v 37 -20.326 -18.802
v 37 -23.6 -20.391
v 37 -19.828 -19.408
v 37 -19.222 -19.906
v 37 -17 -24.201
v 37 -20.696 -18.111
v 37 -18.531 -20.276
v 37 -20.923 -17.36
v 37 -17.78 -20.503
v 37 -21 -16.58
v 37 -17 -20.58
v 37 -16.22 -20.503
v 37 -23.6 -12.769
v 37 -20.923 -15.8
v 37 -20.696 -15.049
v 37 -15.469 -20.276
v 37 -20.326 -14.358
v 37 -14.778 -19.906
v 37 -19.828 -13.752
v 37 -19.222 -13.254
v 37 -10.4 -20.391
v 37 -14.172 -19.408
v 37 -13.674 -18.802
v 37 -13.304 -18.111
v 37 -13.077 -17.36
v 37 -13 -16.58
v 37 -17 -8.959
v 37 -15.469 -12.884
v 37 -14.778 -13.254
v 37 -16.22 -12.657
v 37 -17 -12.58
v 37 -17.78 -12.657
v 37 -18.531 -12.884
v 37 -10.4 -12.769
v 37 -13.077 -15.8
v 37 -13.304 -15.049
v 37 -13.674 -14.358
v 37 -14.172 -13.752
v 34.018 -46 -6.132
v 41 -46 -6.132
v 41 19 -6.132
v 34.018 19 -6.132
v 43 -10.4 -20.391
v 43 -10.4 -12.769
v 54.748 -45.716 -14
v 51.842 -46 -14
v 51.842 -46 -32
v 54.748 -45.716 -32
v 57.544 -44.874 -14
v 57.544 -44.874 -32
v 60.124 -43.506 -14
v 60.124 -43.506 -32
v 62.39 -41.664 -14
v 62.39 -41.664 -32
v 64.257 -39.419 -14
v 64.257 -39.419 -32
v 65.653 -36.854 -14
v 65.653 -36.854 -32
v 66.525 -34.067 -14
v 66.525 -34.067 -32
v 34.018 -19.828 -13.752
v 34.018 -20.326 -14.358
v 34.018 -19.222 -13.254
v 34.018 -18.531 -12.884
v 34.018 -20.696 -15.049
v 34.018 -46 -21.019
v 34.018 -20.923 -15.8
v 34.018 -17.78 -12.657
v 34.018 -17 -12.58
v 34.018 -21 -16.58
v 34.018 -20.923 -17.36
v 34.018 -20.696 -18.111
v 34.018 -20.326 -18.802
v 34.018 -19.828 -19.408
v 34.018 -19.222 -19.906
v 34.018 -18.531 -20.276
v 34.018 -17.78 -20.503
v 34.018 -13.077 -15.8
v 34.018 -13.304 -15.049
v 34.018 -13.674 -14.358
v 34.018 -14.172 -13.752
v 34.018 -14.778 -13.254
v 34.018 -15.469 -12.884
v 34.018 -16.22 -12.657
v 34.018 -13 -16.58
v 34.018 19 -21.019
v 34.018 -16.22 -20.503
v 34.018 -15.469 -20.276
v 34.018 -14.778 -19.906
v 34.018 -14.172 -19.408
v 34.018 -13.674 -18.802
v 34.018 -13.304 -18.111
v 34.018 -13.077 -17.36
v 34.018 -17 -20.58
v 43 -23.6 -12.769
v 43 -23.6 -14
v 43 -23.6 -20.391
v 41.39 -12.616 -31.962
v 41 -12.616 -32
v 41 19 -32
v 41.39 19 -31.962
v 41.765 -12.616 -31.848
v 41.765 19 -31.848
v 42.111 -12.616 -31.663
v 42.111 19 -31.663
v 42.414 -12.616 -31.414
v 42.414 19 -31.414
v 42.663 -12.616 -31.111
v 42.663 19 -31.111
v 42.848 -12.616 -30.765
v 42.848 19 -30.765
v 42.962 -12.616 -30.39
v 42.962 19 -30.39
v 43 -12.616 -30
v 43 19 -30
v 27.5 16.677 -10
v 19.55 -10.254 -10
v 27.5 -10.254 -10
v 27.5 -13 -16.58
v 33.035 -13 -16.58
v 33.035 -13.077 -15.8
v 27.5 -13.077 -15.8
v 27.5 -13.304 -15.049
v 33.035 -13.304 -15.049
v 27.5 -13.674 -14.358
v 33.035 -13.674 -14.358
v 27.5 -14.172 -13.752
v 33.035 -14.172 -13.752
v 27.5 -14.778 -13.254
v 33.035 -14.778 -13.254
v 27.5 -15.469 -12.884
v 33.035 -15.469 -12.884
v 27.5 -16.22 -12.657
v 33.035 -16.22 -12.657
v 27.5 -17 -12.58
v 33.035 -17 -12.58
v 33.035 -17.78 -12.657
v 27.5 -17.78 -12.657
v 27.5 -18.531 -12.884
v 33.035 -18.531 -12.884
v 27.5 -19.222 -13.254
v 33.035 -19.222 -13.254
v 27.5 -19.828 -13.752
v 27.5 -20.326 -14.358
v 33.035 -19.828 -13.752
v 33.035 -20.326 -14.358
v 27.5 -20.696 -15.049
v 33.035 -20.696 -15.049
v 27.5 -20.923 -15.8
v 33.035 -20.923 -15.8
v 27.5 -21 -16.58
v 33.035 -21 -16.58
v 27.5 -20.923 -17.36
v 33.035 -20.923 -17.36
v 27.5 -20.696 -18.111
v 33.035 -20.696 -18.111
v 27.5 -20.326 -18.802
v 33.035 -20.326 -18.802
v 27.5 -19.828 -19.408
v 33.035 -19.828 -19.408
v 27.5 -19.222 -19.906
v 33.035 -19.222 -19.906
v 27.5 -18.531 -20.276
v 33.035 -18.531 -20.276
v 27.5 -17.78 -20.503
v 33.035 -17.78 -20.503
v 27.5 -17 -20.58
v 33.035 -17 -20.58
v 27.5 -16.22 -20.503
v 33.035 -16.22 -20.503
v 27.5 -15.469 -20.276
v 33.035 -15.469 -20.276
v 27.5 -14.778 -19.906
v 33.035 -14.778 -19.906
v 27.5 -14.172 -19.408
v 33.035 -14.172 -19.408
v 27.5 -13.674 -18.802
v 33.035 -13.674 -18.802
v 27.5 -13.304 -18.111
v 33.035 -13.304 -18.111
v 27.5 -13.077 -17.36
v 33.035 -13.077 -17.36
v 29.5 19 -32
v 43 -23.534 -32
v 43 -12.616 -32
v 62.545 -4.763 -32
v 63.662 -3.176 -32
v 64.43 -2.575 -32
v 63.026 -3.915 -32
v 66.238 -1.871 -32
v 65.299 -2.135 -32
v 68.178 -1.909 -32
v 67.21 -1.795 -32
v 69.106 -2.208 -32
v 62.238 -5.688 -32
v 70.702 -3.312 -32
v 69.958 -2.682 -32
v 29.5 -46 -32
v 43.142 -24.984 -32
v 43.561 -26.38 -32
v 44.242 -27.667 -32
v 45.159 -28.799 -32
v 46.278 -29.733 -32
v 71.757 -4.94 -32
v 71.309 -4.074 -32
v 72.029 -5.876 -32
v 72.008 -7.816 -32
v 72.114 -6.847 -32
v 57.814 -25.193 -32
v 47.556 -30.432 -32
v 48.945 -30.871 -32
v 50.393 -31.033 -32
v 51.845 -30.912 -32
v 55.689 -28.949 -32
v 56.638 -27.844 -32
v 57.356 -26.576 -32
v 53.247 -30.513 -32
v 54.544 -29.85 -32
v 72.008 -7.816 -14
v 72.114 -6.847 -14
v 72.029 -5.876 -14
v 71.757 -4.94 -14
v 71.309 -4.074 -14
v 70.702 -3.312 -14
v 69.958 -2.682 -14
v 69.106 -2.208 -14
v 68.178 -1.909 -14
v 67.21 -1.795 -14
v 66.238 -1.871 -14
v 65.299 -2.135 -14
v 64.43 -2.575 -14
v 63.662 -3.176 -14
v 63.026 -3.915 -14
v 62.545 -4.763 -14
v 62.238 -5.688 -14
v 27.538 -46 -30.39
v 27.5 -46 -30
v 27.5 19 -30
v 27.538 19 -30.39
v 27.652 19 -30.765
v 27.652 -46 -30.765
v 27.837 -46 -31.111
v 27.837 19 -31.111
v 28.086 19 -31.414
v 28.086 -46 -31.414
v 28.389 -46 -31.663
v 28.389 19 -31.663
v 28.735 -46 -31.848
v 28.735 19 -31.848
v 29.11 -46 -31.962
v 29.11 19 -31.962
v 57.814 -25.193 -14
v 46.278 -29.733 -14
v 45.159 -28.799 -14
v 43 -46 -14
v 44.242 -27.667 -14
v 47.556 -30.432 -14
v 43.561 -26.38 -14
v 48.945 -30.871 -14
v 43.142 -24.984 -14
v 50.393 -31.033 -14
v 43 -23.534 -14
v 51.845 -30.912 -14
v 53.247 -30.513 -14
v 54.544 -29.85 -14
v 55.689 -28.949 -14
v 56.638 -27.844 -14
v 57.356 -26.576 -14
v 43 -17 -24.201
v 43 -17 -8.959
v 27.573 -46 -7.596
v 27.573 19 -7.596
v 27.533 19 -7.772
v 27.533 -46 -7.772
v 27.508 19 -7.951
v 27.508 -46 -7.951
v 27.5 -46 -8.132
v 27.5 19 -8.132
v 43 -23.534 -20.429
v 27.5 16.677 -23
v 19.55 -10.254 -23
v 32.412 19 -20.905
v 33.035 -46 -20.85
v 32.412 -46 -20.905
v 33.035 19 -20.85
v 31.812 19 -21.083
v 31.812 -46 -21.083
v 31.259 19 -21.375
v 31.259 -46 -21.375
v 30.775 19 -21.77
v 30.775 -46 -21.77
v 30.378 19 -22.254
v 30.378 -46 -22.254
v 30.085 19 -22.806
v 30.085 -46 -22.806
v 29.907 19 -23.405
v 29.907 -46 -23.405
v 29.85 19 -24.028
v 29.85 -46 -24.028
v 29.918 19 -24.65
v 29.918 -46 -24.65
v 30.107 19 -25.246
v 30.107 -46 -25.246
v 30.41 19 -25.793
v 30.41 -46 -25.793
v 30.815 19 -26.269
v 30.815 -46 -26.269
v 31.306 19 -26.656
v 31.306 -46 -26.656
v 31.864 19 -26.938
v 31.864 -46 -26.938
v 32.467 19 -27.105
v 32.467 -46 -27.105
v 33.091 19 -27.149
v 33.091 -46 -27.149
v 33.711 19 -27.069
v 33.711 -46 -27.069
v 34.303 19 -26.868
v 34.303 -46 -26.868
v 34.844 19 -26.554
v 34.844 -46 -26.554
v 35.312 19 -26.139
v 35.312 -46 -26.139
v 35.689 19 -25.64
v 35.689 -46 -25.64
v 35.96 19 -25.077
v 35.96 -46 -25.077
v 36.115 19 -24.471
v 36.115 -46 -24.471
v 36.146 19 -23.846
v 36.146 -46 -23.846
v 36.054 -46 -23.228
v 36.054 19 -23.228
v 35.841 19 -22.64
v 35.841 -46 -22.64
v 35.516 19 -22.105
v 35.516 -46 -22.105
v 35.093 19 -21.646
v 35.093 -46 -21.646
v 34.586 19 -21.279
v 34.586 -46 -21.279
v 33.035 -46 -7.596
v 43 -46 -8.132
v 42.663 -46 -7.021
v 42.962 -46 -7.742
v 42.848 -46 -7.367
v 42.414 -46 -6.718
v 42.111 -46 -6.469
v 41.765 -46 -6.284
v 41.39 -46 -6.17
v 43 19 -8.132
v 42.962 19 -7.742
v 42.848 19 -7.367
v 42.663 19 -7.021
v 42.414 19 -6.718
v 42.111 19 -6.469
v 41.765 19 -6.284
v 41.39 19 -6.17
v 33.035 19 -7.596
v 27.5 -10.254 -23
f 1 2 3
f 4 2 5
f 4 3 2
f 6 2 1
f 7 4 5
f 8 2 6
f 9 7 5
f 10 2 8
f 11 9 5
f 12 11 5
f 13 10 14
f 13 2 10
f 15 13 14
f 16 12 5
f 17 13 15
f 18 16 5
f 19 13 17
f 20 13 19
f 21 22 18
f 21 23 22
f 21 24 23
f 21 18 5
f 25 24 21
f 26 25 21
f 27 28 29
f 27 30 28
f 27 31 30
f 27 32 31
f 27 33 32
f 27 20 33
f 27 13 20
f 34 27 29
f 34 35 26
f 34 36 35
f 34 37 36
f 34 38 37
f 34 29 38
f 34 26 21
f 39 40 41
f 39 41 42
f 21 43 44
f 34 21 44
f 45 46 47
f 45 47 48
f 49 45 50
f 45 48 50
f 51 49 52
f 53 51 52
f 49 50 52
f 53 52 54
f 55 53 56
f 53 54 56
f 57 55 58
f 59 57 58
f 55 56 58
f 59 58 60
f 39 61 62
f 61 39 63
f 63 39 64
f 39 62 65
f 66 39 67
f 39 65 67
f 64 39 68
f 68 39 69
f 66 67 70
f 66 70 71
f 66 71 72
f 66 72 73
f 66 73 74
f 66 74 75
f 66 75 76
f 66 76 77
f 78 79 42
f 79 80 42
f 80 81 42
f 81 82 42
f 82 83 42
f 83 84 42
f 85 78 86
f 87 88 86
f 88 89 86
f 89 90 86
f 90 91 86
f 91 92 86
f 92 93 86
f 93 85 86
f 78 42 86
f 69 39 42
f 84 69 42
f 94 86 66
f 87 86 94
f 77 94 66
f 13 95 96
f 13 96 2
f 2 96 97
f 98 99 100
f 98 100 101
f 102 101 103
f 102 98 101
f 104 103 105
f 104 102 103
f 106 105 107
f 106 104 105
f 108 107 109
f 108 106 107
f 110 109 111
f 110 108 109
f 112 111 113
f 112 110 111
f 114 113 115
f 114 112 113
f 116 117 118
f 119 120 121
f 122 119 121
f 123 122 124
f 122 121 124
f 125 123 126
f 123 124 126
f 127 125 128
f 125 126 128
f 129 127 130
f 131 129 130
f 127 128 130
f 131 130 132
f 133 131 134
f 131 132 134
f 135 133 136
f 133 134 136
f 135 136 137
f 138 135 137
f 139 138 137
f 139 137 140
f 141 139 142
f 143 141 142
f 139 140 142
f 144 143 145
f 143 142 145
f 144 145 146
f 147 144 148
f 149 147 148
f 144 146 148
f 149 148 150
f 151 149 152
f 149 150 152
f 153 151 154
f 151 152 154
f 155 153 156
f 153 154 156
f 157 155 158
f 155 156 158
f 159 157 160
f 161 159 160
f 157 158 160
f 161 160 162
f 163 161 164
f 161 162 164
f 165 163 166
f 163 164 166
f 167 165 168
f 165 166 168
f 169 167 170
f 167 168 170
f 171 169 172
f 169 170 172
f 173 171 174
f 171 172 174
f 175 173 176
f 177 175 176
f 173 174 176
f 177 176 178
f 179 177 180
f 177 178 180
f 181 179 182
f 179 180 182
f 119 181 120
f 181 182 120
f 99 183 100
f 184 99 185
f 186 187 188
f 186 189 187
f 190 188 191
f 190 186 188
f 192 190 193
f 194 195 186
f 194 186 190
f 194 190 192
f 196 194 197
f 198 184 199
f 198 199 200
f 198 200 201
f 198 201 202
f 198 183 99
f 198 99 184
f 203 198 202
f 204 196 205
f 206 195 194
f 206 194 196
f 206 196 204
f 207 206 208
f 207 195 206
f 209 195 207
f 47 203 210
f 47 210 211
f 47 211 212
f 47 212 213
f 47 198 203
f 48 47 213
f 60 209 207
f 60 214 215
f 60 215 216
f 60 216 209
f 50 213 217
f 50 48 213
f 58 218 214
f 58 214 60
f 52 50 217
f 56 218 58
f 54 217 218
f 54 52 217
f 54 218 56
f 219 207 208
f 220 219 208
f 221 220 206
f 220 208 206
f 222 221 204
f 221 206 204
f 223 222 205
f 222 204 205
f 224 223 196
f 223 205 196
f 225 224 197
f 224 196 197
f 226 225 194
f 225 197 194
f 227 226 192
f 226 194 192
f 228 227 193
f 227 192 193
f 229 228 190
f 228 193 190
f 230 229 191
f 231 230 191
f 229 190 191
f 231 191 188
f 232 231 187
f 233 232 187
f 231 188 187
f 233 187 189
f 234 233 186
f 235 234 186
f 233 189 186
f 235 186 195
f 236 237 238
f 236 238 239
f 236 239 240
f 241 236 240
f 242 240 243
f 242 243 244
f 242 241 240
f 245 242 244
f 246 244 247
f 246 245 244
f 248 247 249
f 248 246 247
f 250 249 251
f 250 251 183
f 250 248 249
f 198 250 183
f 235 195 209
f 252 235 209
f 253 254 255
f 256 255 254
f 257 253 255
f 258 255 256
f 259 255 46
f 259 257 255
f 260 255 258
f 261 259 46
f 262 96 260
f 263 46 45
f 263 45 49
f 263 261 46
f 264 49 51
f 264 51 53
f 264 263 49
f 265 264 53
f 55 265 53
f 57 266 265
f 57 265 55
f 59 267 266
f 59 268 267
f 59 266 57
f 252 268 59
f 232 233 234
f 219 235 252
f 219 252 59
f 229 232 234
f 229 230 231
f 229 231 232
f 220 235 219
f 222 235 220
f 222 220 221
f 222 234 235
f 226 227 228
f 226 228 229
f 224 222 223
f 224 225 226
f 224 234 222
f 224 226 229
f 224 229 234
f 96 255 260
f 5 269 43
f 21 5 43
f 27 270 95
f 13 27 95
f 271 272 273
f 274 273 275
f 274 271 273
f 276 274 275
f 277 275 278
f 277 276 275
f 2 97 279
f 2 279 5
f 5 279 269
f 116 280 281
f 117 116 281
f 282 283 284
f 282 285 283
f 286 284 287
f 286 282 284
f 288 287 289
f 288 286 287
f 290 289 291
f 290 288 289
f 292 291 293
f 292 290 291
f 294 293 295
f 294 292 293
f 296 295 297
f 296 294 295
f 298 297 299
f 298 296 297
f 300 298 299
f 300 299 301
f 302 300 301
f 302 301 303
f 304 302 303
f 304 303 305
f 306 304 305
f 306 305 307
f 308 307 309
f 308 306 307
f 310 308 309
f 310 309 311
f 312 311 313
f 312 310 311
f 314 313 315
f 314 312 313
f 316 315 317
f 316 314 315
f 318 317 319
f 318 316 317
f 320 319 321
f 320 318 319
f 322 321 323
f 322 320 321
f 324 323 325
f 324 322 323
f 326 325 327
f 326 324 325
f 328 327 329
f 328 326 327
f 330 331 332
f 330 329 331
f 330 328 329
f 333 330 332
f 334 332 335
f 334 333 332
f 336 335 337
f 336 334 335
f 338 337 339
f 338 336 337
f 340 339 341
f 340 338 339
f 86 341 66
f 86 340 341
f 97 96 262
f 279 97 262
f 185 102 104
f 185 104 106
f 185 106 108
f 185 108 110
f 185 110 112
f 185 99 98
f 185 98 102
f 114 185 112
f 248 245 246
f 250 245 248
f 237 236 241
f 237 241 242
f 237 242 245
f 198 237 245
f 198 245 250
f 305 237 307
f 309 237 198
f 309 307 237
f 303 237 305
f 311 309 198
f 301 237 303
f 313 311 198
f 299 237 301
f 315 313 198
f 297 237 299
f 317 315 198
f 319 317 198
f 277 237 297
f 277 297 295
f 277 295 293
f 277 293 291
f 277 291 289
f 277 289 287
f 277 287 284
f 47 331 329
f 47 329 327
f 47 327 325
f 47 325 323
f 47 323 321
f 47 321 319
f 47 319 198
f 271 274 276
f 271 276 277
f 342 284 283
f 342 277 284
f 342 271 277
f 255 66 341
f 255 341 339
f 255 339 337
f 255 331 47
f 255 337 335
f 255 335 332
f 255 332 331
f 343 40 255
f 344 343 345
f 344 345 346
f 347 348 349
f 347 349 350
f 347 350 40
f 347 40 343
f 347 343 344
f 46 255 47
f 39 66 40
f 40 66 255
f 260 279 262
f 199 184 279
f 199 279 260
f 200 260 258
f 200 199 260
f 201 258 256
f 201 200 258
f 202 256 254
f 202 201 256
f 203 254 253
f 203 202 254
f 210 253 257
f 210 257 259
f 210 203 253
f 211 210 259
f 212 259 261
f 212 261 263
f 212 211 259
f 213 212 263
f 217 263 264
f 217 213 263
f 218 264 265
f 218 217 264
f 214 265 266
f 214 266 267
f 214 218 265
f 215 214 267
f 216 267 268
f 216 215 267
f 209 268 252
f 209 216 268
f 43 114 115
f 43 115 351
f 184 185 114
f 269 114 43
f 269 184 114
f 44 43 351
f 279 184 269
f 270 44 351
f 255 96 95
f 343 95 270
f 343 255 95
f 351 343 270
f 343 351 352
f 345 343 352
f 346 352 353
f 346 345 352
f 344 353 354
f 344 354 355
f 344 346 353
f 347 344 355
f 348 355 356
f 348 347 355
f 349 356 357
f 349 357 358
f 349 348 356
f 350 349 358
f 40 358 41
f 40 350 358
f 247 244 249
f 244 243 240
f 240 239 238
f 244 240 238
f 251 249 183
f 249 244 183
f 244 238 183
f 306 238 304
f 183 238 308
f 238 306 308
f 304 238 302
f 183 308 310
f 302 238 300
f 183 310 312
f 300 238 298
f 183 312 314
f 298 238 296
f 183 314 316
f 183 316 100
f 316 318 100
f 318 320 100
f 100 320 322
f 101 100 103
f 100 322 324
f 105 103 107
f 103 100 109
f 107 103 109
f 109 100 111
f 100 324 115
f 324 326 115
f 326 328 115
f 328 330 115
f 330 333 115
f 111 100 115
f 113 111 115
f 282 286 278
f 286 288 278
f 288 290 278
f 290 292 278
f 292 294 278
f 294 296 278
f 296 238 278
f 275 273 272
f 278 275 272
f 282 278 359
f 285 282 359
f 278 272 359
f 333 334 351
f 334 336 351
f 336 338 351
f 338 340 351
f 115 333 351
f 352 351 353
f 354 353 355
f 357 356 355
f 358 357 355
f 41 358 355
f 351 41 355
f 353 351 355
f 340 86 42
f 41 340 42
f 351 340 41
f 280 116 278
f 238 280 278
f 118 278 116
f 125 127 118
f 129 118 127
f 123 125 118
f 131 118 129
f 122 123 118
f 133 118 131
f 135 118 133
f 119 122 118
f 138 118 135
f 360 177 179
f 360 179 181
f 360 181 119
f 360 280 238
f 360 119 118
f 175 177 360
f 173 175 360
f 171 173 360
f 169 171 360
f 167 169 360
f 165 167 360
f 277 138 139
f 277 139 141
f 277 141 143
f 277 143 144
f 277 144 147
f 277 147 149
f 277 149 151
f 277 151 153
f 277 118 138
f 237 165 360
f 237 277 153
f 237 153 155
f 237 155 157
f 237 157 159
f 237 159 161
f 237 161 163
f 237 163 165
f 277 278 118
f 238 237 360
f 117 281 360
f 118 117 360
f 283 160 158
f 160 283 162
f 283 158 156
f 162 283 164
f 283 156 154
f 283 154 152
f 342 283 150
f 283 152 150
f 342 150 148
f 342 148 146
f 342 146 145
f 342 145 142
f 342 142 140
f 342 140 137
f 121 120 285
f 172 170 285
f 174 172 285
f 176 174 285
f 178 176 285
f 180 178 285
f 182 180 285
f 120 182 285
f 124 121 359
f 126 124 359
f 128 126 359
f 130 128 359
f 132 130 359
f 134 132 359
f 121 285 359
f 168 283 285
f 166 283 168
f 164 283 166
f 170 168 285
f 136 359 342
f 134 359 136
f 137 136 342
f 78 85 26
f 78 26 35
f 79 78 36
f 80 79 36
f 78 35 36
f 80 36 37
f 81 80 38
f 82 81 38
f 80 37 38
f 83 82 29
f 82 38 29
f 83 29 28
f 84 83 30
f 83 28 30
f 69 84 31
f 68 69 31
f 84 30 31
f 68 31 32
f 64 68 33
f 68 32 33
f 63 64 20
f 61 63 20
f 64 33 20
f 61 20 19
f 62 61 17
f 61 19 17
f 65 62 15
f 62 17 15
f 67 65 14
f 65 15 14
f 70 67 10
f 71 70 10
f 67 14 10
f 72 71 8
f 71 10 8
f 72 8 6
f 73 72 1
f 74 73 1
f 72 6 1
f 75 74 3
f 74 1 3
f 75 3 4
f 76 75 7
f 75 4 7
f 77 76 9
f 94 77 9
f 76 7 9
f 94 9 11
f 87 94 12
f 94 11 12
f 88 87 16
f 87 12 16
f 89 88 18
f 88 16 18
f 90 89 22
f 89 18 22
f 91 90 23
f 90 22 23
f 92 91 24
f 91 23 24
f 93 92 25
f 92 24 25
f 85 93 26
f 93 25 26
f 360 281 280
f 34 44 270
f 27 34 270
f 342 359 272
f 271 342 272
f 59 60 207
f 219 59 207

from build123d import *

# Parameters (mm, degrees)
PAD037_DEPTH    = 65
PAD038_DEPTH    = 13
SKETCH098_R     = 4
POCKET036_DEPTH = 32.5
SKETCH099_R     = 3.15
POCKET037_DEPTH = 75
POCKET038_DEPTH = 65
PAD040_DEPTH    = 18
POCKET039_DEPTH = 6


with BuildPart() as part:
    # Sketch095 → Pad037 (new body)
    with BuildSketch(Plane.XZ.offset(66)):
        with BuildLine():
            Line((8, 17.868052), (-3.5, 17.868052))
            ThreePointArc((-3.5, 17.868052), (-4.914214, 17.282266), (-5.5, 15.868052))
            Line((-5.5, 15.868052), (-5.5, -6))
            ThreePointArc((-5.5, -6), (-4.914214, -7.414214), (-3.5, -8))
            Line((-3.5, -8), (8, -8))
            ThreePointArc((8, -8), (9.414214, -7.414214), (10, -6))
            Line((10, -6), (10, 15.868052))
            ThreePointArc((10, 15.868052), (9.414214, 17.282266), (8, 17.868052))
        make_face()
    extrude(amount=-PAD037_DEPTH)

    # Sketch096 → Pad038 (join)
    with BuildSketch(Plane.XY.offset(1)):
        Polygon((-4.849713, -30.253677), (-4.849713, -1.120098), (-13.449671, -30.253677), align=None)
    extrude(amount=PAD038_DEPTH)

    # Sketch098 → Pocket036 (cut, symmetric)
    with BuildSketch(Plane(origin=(0, -37, 7.42), x_dir=(0, 1, 0), z_dir=(1, 0, 0))):
        Circle(SKETCH098_R)
    extrude(amount=POCKET036_DEPTH, both=True, mode=Mode.SUBTRACT)

    # Sketch099 → Pocket037 (cut)
    with BuildSketch(Plane.XZ.offset(1)):
        Circle(SKETCH099_R)
    extrude(amount=POCKET037_DEPTH, mode=Mode.SUBTRACT)

    # Sketch100 → Pocket038 (cut)
    with BuildSketch(Plane.XZ.offset(1)):
        Polygon((-6.320894, 20), (1.017517, 20), (1.017517, 0), (0.034595, 0), (0.034595, 16.403641), (-6.320894, 16.403641), align=None)
    extrude(amount=POCKET038_DEPTH, mode=Mode.SUBTRACT)

    # Sketch103 → Pad040 (join)
    with BuildSketch(Plane.XY.offset(-8)):
        with BuildLine():
            Line((6.490593, -32.616061), (6.490593, -66))
            Line((6.490593, -66), (18.841947, -66))
            ThreePointArc((18.841947, -66), (28.302274, -62.640542), (33.525058, -54.066961))
            Line((33.525058, -54.066961), (39.008216, -27.816282))
            ThreePointArc((39.008216, -27.816282), (35.177971, -21.90851), (29.23767, -25.688111))
            Line((29.23767, -25.688111), (24.814264, -45.192815))
            ThreePointArc((10, -43.534037), (16.665428, -50.987459), (24.814264, -45.192815))
            Line((10, -43.534037), (10, -32.616061))
            Line((6.490593, -32.616061), (10, -32.616061))
        make_face()
    extrude(amount=PAD040_DEPTH)

    # Sketch102 → Pocket039 (cut)
    with BuildSketch(Plane(origin=(10, -37, 7.42), x_dir=(0, 1, 0), z_dir=(1, 0, 0))):
        Polygon((0, 7.621024), (-6.6, 3.810512), (-6.6, -3.810512), (0, -7.621024), (6.6, -3.810512), (6.6, 3.810512), align=None)
    extrude(amount=-POCKET039_DEPTH, mode=Mode.SUBTRACT)


with BuildPart() as part_1:
    # Body022 placement: moved
    add(part.part.moved(Location((33, 20, -24))))


solid = part_1.part
